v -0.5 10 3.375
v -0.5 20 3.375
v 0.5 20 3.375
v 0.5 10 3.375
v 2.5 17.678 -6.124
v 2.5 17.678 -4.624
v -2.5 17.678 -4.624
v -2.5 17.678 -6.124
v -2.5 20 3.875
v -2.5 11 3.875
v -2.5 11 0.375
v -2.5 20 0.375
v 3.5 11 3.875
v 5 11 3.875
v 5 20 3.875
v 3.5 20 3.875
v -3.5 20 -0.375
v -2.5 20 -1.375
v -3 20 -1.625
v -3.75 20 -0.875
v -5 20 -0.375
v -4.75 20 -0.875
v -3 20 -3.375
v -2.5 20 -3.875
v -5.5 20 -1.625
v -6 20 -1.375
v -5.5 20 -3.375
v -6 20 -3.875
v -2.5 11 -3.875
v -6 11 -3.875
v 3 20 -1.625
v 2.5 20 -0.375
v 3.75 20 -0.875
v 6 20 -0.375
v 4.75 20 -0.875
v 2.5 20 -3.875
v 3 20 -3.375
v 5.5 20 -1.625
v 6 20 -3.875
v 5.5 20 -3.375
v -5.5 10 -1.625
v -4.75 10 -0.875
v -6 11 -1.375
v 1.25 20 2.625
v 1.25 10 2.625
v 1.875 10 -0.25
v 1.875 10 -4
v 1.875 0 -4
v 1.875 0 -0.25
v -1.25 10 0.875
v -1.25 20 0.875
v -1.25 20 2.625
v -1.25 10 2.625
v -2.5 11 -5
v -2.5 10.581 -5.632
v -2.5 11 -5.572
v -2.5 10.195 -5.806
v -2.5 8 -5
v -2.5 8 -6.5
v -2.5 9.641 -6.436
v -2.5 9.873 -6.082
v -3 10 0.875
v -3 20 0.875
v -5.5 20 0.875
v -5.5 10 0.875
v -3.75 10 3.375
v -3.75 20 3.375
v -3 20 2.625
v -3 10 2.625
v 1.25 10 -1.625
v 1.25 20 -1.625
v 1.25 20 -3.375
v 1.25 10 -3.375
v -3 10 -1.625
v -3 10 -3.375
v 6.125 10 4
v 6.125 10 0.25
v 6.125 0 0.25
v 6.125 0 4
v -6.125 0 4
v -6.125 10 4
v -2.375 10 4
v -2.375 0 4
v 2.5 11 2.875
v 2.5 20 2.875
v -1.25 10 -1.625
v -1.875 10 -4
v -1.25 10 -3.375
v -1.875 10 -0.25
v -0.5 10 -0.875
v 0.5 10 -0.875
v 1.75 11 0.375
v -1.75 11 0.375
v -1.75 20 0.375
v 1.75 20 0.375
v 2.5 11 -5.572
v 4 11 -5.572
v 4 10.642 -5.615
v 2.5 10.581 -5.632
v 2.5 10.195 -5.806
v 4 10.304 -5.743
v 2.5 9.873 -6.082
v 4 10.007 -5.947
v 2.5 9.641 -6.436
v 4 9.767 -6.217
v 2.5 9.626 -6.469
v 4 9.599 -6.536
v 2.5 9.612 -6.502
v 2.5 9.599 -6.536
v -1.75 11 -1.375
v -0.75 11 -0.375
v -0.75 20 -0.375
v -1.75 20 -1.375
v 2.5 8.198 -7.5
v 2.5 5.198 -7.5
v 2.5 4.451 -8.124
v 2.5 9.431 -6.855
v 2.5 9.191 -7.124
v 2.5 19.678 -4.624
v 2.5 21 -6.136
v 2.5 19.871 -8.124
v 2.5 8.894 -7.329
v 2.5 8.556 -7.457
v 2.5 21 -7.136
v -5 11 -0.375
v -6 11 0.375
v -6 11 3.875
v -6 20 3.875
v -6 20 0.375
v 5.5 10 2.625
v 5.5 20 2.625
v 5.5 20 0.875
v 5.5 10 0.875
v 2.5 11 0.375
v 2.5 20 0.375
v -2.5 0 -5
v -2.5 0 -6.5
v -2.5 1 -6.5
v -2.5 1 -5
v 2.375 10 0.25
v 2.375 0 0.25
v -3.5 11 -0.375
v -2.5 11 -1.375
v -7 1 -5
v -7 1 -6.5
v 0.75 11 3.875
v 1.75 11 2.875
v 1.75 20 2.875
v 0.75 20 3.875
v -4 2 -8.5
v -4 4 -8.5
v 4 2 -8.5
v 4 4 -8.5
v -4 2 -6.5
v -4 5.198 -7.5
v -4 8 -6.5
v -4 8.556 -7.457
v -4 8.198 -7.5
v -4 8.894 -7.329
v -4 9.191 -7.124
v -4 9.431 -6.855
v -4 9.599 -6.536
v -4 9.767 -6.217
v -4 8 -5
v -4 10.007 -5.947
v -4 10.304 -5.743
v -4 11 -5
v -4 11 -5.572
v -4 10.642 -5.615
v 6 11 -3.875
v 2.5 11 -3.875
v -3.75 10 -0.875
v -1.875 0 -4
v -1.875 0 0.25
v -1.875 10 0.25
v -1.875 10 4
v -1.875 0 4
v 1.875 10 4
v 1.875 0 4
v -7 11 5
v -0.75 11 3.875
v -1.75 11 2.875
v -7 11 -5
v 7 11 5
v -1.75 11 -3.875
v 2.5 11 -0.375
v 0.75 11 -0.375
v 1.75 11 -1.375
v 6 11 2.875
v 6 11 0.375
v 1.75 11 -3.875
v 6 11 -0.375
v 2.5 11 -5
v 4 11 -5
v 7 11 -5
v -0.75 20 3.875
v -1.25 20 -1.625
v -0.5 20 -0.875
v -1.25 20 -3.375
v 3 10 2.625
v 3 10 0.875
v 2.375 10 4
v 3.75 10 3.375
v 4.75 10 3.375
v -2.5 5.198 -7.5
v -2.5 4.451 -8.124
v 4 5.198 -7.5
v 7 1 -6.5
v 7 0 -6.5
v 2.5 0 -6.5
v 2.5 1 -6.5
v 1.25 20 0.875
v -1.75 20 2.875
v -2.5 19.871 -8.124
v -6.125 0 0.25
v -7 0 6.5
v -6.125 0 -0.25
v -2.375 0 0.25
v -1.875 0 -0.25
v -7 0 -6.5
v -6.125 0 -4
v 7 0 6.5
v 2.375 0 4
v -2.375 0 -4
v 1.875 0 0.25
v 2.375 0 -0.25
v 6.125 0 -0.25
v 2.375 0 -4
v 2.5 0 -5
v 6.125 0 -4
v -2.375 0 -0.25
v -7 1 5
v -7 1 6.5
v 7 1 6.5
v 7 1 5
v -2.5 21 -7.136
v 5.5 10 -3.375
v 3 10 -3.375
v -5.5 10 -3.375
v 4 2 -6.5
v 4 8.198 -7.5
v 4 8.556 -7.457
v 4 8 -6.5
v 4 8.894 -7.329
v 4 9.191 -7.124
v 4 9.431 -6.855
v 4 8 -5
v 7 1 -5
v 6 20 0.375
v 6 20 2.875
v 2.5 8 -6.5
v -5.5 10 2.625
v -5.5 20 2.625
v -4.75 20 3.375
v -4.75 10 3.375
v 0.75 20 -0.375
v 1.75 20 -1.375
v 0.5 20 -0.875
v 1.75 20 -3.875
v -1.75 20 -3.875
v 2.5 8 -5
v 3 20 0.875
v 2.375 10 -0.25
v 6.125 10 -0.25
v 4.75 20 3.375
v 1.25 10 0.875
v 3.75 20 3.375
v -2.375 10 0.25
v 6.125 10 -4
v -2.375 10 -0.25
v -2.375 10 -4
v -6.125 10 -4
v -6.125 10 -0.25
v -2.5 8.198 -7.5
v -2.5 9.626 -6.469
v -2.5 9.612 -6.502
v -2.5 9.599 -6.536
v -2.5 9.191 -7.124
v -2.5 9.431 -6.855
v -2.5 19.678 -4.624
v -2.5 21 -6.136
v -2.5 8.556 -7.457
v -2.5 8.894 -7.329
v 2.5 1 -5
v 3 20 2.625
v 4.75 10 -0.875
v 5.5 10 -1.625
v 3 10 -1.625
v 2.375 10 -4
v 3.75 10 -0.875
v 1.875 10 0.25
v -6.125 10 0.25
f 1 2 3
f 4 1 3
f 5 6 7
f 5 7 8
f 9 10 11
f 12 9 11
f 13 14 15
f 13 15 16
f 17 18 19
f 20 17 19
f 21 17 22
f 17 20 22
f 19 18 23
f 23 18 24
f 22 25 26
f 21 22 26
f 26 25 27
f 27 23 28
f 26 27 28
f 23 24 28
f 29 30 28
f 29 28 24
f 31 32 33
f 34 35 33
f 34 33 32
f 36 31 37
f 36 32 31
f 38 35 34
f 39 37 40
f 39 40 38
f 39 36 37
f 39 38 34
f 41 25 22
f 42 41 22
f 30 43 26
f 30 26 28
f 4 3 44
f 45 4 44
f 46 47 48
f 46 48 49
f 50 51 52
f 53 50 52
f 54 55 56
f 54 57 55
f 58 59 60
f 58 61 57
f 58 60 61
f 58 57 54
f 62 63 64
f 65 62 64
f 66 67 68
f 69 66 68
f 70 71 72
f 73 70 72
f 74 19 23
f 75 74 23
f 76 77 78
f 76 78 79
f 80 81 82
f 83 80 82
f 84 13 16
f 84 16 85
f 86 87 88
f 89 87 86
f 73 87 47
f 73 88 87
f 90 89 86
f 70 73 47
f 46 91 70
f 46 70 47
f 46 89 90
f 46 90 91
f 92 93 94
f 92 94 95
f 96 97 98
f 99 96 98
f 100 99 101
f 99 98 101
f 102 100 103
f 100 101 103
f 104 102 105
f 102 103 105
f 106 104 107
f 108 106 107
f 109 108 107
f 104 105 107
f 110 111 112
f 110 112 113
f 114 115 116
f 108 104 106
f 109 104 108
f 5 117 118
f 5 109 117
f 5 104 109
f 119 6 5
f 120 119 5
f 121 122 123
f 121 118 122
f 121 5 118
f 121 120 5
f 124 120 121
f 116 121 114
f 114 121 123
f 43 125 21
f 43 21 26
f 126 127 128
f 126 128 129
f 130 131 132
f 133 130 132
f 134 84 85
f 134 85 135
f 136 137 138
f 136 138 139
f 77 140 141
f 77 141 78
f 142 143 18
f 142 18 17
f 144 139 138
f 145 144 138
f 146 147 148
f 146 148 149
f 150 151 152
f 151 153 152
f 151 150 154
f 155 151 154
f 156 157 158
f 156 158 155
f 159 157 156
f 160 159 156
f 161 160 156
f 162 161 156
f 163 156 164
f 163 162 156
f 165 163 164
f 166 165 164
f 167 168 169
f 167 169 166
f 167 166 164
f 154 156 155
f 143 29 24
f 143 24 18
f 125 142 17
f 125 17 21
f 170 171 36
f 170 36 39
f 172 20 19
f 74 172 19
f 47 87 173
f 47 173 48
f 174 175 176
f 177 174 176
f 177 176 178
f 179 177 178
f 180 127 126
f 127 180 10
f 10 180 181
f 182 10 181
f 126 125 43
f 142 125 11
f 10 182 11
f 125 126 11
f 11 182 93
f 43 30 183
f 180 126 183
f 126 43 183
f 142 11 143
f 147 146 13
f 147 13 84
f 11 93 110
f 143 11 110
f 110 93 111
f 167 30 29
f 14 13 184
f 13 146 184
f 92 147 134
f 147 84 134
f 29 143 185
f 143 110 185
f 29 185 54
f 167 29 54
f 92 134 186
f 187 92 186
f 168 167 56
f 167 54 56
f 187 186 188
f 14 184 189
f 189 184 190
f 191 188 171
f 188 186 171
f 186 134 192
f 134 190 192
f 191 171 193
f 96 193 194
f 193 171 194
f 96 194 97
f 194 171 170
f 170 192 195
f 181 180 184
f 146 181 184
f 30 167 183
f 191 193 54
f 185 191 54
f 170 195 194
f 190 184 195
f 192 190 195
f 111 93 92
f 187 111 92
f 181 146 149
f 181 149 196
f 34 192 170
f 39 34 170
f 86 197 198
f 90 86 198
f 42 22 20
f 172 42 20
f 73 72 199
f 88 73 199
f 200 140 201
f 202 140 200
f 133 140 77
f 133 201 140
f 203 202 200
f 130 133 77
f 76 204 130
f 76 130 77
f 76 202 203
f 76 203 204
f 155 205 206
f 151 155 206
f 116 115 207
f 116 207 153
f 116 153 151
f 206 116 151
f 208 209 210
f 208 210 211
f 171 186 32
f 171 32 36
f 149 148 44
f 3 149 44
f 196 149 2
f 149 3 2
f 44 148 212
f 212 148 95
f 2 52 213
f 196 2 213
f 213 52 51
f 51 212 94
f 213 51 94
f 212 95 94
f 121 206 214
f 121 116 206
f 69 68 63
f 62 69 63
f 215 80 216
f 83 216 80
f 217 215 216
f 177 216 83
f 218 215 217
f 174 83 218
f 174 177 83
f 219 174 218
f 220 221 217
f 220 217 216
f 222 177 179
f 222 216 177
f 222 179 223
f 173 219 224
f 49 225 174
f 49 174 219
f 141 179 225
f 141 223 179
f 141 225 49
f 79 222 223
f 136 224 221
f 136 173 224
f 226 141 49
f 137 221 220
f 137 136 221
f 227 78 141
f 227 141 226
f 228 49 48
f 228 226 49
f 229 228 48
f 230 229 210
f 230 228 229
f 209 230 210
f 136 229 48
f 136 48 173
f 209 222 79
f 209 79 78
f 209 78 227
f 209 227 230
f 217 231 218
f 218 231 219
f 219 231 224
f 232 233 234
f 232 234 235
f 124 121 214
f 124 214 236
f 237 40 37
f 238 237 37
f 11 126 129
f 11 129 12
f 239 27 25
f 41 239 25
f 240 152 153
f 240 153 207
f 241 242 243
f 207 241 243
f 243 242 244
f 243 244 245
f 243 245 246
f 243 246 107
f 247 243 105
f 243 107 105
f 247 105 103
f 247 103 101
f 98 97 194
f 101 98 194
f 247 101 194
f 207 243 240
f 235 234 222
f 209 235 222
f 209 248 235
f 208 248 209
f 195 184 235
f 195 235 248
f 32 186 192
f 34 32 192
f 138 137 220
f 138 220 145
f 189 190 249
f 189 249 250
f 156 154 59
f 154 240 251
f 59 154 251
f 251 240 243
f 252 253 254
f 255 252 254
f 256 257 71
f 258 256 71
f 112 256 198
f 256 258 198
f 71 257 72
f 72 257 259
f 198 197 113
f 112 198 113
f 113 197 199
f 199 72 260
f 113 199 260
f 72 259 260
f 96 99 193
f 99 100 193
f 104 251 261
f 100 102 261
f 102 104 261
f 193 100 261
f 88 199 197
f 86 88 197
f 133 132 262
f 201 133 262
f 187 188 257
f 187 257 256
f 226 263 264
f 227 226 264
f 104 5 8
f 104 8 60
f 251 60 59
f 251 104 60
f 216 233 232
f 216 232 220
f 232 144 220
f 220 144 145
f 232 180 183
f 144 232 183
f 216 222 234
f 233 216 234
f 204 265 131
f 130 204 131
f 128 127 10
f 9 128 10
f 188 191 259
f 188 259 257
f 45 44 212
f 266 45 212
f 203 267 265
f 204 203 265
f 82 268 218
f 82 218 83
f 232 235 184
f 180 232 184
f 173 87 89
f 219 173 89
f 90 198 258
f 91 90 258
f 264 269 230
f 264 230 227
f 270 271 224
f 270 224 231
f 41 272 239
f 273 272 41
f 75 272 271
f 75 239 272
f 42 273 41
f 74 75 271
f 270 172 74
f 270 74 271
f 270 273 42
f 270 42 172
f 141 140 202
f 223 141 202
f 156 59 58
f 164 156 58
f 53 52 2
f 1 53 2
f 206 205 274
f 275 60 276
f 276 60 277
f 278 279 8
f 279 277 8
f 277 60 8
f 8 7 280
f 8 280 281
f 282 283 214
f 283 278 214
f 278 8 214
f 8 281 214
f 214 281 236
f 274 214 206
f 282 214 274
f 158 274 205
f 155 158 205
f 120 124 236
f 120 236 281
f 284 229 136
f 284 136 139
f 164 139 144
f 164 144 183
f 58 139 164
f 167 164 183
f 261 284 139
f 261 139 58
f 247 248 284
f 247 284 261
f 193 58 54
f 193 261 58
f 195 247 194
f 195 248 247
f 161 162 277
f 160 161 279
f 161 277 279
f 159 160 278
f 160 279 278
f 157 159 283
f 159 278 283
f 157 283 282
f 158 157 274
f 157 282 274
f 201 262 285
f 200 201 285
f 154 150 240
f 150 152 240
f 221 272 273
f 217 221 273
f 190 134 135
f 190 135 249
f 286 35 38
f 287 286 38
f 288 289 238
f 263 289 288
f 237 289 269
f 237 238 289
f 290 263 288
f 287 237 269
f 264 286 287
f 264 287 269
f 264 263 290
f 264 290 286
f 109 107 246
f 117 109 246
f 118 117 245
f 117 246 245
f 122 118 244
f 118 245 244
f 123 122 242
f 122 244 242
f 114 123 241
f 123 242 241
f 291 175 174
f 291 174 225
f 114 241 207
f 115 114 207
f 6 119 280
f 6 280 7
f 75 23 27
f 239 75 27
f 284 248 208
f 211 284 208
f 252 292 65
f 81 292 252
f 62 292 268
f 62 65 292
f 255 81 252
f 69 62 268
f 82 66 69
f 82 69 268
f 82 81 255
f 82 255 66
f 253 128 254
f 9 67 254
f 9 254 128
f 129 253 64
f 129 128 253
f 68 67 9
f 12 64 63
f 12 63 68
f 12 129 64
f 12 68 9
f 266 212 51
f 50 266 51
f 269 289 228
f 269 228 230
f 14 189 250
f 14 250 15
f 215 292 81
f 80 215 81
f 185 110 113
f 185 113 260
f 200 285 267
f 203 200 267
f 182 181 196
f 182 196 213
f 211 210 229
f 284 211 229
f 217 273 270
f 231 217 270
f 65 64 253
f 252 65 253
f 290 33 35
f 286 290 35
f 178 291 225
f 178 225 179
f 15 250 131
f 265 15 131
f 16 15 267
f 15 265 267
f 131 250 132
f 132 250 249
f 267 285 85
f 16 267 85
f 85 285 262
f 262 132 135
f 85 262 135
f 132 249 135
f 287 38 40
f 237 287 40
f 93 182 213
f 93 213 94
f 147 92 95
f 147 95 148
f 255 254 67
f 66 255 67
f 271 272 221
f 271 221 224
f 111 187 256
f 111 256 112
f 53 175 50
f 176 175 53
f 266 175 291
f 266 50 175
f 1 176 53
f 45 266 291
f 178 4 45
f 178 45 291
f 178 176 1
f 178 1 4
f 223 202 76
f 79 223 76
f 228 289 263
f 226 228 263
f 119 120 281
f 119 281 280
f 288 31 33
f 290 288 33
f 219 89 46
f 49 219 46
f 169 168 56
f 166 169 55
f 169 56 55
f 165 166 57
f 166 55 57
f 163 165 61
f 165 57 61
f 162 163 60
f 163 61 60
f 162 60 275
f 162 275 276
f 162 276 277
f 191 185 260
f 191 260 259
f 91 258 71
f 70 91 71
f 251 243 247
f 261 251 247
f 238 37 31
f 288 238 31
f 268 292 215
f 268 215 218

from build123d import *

# Parameters (mm, degrees)
SKIZZE1_W                       = 10
SKIZZE1_H                       = 11
AUFSATZ_LINEAR_AUSTRAGEN1_DEPTH = 7
SKIZZE2_W                       = 1.5
SKIZZE2_H                       = 1
AUFSATZ_LINEAR_AUSTRAGEN2_DEPTH = 7
AUFSATZ_LINEAR_AUSTRAGEN3_DEPTH = 4
SKIZZE4_W                       = 5
SKIZZE4_H                       = 1.5
SCHNITT_LINEAR_AUSTRAGEN1_DEPTH = 12
AUFSATZ_LINEAR_AUSTRAGEN4_DEPTH = 2.5
SKIZZE6_W                       = 3.75
SKIZZE6_H                       = 3.75
SCHNITT_LINEAR_AUSTRAGEN2_DEPTH = 10
LINEARES_MUSTER1_COUNT          = 3
LINEARES_MUSTER1_PITCH          = 4.25
LINEARES_MUSTER1_COUNT_DIR2     = 2
LINEARES_MUSTER1_PITCH_DIR2     = 4.25
SKIZZE7_W                       = 3.5
SKIZZE7_H                       = 3.5
AUFSATZ_LINEAR_AUSTRAGEN5_DEPTH = 9
LINEARES_MUSTER2_COUNT          = 3
LINEARES_MUSTER2_PITCH          = 4.25
LINEARES_MUSTER2_COUNT_DIR2     = 2
LINEARES_MUSTER2_PITCH_DIR2     = 4.25
AUFSATZ_LINEAR_AUSTRAGEN7_DEPTH = 9
LINEARES_MUSTER4_COUNT          = 3
LINEARES_MUSTER4_PITCH          = 4.25
LINEARES_MUSTER4_COUNT_DIR2     = 2
LINEARES_MUSTER4_PITCH_DIR2     = 4.25
SCHNITT_LINEAR_AUSTRAGEN4_DEPTH = 21
LINEARES_MUSTER6_COUNT          = 3
LINEARES_MUSTER6_PITCH          = 4.25
LINEARES_MUSTER6_COUNT_DIR2     = 2
LINEARES_MUSTER6_PITCH_DIR2     = 4.25


with BuildPart() as part:
    # Skizze1 → Aufsatz-Linear austragen1 (new body, symmetric)
    with BuildSketch(Plane(origin=(0, 0, 0), x_dir=(0, 0, -1), z_dir=(1, 0, 0))):
        with Locations((0, 5.5)):
            Rectangle(SKIZZE1_W, SKIZZE1_H)
    extrude(amount=AUFSATZ_LINEAR_AUSTRAGEN1_DEPTH, both=True)

    # Skizze2 → Aufsatz-Linear austragen2 (add, symmetric)
    with BuildSketch(Plane(origin=(0, 0, 0), x_dir=(0, 0, -1), z_dir=(1, 0, 0))):
        with Locations((-5.75, 0.5)):
            Rectangle(SKIZZE2_W, SKIZZE2_H)
        with Locations((5.75, 0.5)):
            Rectangle(SKIZZE2_W, SKIZZE2_H)
    extrude(amount=AUFSATZ_LINEAR_AUSTRAGEN2_DEPTH, both=True)

    # Skizze3 → Aufsatz-Linear austragen3 (add, symmetric)
    with BuildSketch(Plane(origin=(0, 0, 0), x_dir=(0, 0, -1), z_dir=(1, 0, 0))):
        with BuildLine():
            Line((5, 11), (5.571713615, 11))
            ThreePointArc((5.571713615, 11), (5.836038655, 10.149642784), (6.535856807, 9.598979842))
            ThreePointArc((6.535856807, 9.598979842), (7.23567496, 9.048316901), (7.5, 8.197959685))
            Line((7.5, 8.197959685), (7.5, 5.197959685))
            Line((7.5, 5.197959685), (8.5, 4))
            Line((8.5, 4), (8.5, 2))
            Line((8.5, 2), (6.5, 2))
            Line((6.5, 2), (6.5, 8))
            Line((6.5, 8), (5, 8))
            Line((5, 8), (5, 11))
        make_face()
    extrude(amount=AUFSATZ_LINEAR_AUSTRAGEN3_DEPTH, both=True)

    # Skizze4 → Schnitt-Linear austragen1 (cut, through all)
    with BuildSketch(Plane.XZ):
        with Locations((0, -5.75)):
            Rectangle(SKIZZE4_W, SKIZZE4_H)
    extrude(amount=-SCHNITT_LINEAR_AUSTRAGEN1_DEPTH, mode=Mode.SUBTRACT)

    # Skizze5 → Aufsatz-Linear austragen4 (add, symmetric)
    with BuildSketch(Plane(origin=(0, 0, 0), x_dir=(0, 0, -1), z_dir=(1, 0, 0))):
        Polygon((8.123516438, 4.451012129), (8.123516438, 19.870653012), (7.136310593, 21), (6.136310593, 21), (4.623516438, 19.677608169), (4.623516438, 17.677608169), (6.123516438, 17.677608169), (6.5, 8), (6.5, 2), align=None)
    extrude(amount=AUFSATZ_LINEAR_AUSTRAGEN4_DEPTH, both=True)

    # Skizze6 → Schnitt-Linear austragen2 (cut)
    with BuildSketch(Plane.XZ):
        with Locations((-4.25, -2.125)):
            Rectangle(SKIZZE6_W, SKIZZE6_H)
    schnitt_linear_austragen2 = extrude(amount=-SCHNITT_LINEAR_AUSTRAGEN2_DEPTH, mode=Mode.SUBTRACT)

    # Lineares Muster1: Schnitt-Linear austragen2 3 × 2
    with Locations(*[(i * LINEARES_MUSTER1_PITCH, 0, j * LINEARES_MUSTER1_PITCH_DIR2) for i in range(LINEARES_MUSTER1_COUNT) for j in range(LINEARES_MUSTER1_COUNT_DIR2) if (i, j) != (0, 0)]):
        add(schnitt_linear_austragen2, mode=Mode.SUBTRACT)

    # Skizze7 → Aufsatz-Linear austragen5 (add)
    with BuildSketch(Plane(origin=(0, 11, 0), x_dir=(1, 0, 0), z_dir=(0, 1, 0))):
        with Locations((-4.25, -2.125)):
            Rectangle(SKIZZE7_W, SKIZZE7_H)
    aufsatz_linear_austragen5 = extrude(amount=AUFSATZ_LINEAR_AUSTRAGEN5_DEPTH)

    # Lineares Muster2: Aufsatz-Linear austragen5 3 × 2, 4 skipped
    with Locations(*[(i * LINEARES_MUSTER2_PITCH, 0, -j * LINEARES_MUSTER2_PITCH_DIR2) for i in range(LINEARES_MUSTER2_COUNT) for j in range(LINEARES_MUSTER2_COUNT_DIR2) if (i, j) not in ((0, 0), (0, 1), (1, 0), (1, 1), (2, 0))]):
        add(aufsatz_linear_austragen5)

    # Skizze10 → Aufsatz-Linear austragen7 (add)
    with BuildSketch(Plane(origin=(0, 11, 0), x_dir=(1, 0, 0), z_dir=(0, 1, 0))):
        Polygon((-2.5, 1.375), (-3.5, 0.375), (-5, 0.375), (-6, 1.375), (-6, 3.875), (-2.5, 3.875), align=None)
    aufsatz_linear_austragen7 = extrude(amount=AUFSATZ_LINEAR_AUSTRAGEN7_DEPTH)

    # Lineares Muster4: Aufsatz-Linear austragen7 3 × 2, 2 skipped
    with Locations(*[(i * LINEARES_MUSTER4_PITCH, 0, j * LINEARES_MUSTER4_PITCH_DIR2) for i in range(LINEARES_MUSTER4_COUNT) for j in range(LINEARES_MUSTER4_COUNT_DIR2) if (i, j) not in ((0, 0), (0, 1), (2, 0))]):
        add(aufsatz_linear_austragen7)

    # Skizze12 → Schnitt-Linear austragen4 (cut, through all)
    with BuildSketch(Plane(origin=(0, 20, 0), x_dir=(1, 0, 0), z_dir=(0, 1, 0))):
        Polygon((-3.75, 0.875), (-3, 1.625), (-3, 3.375), (-5.5, 3.375), (-5.5, 1.625), (-4.75, 0.875), align=None)
    schnitt_linear_austragen4 = extrude(amount=-SCHNITT_LINEAR_AUSTRAGEN4_DEPTH, mode=Mode.SUBTRACT)

    # Lineares Muster6: Schnitt-Linear austragen4 3 × 2
    with Locations(*[(i * LINEARES_MUSTER6_PITCH, 0, j * LINEARES_MUSTER6_PITCH_DIR2) for i in range(LINEARES_MUSTER6_COUNT) for j in range(LINEARES_MUSTER6_COUNT_DIR2) if (i, j) != (0, 0)]):
        add(schnitt_linear_austragen4, mode=Mode.SUBTRACT)


solid = part.part
